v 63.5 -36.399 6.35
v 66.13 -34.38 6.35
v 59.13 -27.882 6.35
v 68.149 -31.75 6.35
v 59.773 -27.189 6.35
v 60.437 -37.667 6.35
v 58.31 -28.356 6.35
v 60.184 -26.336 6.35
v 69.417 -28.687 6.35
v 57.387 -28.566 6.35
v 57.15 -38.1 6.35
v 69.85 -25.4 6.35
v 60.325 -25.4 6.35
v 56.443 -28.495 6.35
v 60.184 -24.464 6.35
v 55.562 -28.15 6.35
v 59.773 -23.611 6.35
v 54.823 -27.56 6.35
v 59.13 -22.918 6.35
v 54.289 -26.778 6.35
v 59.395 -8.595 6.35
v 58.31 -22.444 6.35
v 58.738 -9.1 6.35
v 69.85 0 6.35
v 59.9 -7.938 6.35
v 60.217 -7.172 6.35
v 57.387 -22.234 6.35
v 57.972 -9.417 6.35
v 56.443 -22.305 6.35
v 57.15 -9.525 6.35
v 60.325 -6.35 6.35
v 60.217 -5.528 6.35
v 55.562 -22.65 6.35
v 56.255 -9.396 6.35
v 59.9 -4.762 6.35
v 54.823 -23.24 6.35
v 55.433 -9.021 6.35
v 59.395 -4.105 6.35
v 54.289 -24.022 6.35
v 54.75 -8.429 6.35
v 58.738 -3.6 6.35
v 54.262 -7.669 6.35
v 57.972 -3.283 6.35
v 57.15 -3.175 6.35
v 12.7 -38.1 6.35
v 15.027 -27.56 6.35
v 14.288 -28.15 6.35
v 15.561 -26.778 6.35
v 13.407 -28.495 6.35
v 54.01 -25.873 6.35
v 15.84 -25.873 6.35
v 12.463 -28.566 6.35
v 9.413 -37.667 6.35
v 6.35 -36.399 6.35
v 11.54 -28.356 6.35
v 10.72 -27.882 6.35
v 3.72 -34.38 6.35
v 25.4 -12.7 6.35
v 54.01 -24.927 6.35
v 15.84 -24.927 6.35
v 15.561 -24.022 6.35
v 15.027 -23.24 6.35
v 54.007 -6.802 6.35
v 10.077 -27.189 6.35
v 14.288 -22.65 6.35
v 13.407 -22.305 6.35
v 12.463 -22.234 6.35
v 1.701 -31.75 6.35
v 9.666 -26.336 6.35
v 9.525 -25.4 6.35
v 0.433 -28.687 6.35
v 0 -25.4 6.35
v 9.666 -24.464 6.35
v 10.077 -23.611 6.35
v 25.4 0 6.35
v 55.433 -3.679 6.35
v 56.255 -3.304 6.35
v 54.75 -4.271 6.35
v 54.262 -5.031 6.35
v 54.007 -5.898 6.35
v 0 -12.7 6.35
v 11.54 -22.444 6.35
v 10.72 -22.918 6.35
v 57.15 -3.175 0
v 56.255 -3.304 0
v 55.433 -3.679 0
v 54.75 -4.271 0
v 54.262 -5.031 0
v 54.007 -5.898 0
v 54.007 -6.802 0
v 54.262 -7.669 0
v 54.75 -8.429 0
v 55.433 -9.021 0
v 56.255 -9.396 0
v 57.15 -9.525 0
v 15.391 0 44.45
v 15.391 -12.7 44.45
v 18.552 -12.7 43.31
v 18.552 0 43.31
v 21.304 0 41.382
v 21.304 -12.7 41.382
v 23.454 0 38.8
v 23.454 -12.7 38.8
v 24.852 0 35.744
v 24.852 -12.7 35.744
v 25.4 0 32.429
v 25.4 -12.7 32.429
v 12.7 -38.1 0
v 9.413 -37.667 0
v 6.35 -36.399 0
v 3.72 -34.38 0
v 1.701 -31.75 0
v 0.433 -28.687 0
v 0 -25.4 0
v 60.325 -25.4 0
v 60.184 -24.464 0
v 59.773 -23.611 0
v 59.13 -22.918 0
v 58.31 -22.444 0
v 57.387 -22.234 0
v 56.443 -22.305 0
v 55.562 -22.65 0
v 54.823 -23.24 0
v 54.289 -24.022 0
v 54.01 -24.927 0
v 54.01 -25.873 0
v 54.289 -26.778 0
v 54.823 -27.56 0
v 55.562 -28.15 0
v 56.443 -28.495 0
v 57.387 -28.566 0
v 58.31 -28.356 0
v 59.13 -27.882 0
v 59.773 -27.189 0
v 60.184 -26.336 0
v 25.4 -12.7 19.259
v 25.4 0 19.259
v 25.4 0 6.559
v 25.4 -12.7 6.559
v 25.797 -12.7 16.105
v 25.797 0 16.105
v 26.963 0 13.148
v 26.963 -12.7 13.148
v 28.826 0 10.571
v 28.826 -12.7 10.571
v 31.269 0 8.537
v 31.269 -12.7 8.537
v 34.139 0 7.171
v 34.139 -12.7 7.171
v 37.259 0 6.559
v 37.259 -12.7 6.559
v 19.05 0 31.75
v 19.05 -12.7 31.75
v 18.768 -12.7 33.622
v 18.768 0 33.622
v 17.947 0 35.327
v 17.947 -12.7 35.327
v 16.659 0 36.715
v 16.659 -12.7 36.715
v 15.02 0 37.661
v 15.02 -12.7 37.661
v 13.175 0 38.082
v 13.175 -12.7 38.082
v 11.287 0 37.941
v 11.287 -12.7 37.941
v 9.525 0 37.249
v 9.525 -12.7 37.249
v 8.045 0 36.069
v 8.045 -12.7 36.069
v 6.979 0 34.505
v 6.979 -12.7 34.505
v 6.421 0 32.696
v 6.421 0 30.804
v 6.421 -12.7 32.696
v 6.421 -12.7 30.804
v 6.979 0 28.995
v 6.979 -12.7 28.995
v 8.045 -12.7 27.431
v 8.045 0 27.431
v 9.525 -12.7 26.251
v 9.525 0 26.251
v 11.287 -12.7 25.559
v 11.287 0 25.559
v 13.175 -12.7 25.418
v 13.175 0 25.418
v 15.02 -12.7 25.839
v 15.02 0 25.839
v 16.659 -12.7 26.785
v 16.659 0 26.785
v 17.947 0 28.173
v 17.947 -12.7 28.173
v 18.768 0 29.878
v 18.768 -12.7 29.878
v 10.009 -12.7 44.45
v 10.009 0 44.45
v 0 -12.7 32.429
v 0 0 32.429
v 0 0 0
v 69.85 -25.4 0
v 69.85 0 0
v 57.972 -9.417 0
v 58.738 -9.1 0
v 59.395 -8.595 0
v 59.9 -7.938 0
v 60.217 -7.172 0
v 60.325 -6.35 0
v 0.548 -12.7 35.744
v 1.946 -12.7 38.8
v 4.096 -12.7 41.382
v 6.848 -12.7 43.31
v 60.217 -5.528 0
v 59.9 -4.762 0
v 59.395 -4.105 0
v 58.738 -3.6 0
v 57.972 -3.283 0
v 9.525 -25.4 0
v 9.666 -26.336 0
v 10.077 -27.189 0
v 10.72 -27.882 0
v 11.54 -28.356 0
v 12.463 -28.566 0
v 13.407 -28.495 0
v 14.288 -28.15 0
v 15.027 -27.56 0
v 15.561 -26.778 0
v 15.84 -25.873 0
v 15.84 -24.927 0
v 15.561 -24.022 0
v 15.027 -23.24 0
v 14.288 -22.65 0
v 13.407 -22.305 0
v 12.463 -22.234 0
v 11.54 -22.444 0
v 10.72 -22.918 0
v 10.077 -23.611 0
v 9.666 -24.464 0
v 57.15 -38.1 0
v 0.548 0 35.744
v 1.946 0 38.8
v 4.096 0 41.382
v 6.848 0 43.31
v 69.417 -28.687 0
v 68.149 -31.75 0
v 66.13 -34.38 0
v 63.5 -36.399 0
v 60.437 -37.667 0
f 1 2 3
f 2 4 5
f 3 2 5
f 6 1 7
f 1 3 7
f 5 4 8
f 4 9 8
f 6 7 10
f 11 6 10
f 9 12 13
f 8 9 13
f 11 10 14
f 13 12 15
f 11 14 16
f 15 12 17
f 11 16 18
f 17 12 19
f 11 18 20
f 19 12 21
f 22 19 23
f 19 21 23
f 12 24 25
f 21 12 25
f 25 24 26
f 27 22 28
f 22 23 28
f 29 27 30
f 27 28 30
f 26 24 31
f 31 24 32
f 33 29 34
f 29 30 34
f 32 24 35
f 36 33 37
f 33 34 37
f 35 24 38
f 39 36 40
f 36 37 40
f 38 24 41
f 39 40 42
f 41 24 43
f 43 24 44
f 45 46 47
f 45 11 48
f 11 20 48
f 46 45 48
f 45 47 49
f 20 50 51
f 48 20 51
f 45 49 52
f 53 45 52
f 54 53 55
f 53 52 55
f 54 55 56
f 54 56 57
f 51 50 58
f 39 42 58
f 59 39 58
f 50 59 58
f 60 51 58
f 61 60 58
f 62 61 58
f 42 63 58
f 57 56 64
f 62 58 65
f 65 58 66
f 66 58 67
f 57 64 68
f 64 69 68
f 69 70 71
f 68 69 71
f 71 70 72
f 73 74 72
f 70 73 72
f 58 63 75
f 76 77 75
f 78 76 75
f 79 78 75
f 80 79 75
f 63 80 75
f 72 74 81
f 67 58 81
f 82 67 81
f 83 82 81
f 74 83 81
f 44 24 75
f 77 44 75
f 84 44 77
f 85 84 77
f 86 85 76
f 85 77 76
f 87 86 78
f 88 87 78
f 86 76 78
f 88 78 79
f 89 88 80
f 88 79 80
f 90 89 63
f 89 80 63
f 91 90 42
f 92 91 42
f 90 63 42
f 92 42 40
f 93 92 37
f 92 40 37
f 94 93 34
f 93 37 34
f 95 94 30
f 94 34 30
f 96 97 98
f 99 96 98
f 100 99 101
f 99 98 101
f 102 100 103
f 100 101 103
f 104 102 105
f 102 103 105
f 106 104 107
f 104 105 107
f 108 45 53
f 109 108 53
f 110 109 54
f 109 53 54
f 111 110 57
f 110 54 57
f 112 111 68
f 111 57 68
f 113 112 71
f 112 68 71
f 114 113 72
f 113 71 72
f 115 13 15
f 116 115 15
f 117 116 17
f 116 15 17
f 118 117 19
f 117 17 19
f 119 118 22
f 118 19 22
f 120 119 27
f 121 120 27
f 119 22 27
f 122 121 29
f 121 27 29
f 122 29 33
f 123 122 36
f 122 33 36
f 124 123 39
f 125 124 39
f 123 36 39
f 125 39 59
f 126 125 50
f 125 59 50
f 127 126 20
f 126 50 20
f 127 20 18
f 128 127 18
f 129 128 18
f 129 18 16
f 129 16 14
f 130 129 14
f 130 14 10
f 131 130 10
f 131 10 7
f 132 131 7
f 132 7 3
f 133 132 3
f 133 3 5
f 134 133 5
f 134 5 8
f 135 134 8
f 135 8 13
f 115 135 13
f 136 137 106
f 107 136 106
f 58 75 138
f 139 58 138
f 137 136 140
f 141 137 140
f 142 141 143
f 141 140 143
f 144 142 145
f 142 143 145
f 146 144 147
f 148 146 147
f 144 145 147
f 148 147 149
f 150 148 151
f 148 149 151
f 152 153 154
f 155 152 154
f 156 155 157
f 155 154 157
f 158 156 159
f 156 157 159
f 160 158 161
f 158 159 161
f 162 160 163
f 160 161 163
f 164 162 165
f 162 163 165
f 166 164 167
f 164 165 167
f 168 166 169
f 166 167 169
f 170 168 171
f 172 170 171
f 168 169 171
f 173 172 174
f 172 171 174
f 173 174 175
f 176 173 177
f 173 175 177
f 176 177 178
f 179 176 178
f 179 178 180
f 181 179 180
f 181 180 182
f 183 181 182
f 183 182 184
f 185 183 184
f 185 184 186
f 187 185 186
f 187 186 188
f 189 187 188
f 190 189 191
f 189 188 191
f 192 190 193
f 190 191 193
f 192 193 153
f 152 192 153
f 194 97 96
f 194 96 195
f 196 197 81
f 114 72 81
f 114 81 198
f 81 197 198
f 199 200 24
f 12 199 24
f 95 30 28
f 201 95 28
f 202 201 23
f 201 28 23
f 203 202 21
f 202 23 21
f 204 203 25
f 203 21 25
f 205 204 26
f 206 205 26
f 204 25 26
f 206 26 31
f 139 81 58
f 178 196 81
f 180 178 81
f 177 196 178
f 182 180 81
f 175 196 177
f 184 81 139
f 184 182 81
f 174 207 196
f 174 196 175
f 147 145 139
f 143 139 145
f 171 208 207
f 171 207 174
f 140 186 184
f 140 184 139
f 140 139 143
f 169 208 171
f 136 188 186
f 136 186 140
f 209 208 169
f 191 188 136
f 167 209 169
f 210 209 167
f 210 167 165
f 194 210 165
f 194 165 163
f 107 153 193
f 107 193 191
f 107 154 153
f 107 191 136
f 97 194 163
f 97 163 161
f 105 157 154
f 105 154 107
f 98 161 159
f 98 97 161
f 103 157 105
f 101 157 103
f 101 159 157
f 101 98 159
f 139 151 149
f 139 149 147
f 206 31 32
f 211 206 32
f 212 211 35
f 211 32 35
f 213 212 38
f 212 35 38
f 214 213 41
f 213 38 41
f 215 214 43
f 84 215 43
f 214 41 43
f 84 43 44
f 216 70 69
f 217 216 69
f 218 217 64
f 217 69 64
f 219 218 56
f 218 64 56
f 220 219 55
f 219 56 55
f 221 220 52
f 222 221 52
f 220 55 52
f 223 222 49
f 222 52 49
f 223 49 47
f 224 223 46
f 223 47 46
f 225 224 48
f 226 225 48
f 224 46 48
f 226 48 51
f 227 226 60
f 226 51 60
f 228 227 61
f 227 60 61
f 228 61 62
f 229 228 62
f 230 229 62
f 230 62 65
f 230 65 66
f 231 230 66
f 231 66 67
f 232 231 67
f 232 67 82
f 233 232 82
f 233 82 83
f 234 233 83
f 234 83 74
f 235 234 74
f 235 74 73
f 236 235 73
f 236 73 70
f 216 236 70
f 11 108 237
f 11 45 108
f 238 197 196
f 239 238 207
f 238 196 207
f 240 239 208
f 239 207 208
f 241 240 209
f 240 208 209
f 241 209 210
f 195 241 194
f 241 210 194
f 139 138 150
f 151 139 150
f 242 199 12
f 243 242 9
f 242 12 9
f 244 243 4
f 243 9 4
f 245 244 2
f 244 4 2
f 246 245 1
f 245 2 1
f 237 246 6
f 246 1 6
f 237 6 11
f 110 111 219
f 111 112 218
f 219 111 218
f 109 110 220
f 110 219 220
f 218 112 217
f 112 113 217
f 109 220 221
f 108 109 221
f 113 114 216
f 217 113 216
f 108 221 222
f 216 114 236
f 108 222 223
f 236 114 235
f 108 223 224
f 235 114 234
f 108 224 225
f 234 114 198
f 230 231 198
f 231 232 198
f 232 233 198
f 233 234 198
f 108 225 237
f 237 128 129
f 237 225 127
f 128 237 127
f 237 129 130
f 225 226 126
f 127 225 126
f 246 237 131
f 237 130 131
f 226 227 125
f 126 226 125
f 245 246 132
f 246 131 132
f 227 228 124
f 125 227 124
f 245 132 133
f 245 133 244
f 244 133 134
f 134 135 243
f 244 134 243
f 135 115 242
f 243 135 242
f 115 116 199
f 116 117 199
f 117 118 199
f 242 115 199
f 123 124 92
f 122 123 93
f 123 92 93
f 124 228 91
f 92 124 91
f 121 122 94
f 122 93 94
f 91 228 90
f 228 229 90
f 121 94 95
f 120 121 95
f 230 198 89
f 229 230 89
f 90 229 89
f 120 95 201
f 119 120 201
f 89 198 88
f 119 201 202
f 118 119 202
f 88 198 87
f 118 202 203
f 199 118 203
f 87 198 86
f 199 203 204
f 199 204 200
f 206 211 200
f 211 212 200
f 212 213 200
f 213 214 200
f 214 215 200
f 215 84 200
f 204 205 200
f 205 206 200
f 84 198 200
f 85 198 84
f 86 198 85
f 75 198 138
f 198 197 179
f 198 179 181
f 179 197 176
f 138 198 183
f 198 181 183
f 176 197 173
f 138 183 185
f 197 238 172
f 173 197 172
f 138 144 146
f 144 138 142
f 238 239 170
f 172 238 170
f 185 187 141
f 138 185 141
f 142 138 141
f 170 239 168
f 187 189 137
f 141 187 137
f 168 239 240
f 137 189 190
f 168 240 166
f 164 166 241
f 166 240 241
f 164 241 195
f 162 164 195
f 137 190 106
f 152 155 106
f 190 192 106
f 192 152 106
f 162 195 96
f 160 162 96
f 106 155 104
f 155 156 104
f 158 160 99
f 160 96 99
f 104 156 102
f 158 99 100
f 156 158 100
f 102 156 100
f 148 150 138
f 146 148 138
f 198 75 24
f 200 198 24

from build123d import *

# Parameters (mm, degrees)
F1_DEPTH  = 38.1
F2_W      = 25.4
F2_H      = 38.1
F3_DEPTH  = 25.4
F4_R      = 6.35
F5_DEPTH  = 12.701
F7_DEPTH  = 12.701
F8_W      = 12.7
F8_H      = 12.7
F9_DEPTH  = 12.7
F11_DEPTH = 12.701
F13_DEPTH = 6.351
F14_R     = 3.175
F15_DEPTH = 6.351


with BuildPart() as f1:
    # F0 (on Front) → F1 (new body)
    with BuildSketch(Plane.XZ):
        Polygon((25.4, 44.45), (0, 44.45), (0, 0), (69.85, 0), (69.85, 6.35), (25.4, 6.35), align=None)
    extrude(amount=F1_DEPTH)

    # F2 (on face) → F3 (cut)
    with BuildSketch(Plane.XZ.offset(38.1)):
        with Locations((12.7, 25.4)):
            Rectangle(F2_W, F2_H)
    extrude(amount=-F3_DEPTH, mode=Mode.SUBTRACT)

    # F4 (on face) → F5 (cut, through all)
    with BuildSketch(Plane.XZ.offset(12.7)):
        with Locations((12.7, 31.75)):
            Circle(F4_R)
    extrude(amount=-F5_DEPTH, mode=Mode.SUBTRACT)

    # F6 (on face) → F7 (cut, through all)
    with BuildSketch(Plane.XZ.offset(12.7)):
        with BuildLine():
            ThreePointArc((0, 32.429072573), (-0.0062022328, 32.0321151685), (0, 31.635157764))
            Line((0, 31.635157764), (0, 32.429072573))
        make_face()
        with BuildLine():
            ThreePointArc((19.05, 31.75), (12.642576534, 38.0997403526), (6.3510385683, 31.635157764))
            Line((6.3510385683, 31.635157764), (19.0489614317, 31.635157764))
            ThreePointArc((19.0489614317, 31.635157764), (19.0497403526, 31.692576534), (19.05, 31.75))
        make_face()
        with BuildLine():
            Line((0, 44.45), (0, 32.429072573))
            ThreePointArc((0, 32.429072573), (2.9352888733, 40.1621823142), (10.0085855964, 44.45))
            Line((10.0085855964, 44.45), (0, 44.45))
        make_face()
        with BuildLine():
            ThreePointArc((15.3914144036, 44.45), (12.7, 44.7383174013), (10.0085855964, 44.45))
            Line((10.0085855964, 44.45), (15.3914144036, 44.45))
        make_face()
        with BuildLine():
            Line((25.4, 32.429072573), (25.4, 31.635157764))
            ThreePointArc((25.4, 31.635157764), (25.4062022328, 32.0321151685), (25.4, 32.429072573))
        make_face()
        with BuildLine():
            Line((25.4, 44.45), (15.3914144036, 44.45))
            ThreePointArc((15.3914144036, 44.45), (22.4647111267, 40.1621823142), (25.4, 32.429072573))
            Line((25.4, 32.429072573), (25.4, 44.45))
        make_face()
    extrude(amount=-F7_DEPTH, mode=Mode.SUBTRACT)

    # F8 (on Front) → F9 (join)
    with BuildSketch(Plane.XZ):
        with Locations((30.9091203046, 12.9094149452)):
            Rectangle(F8_W, F8_H)
    extrude(amount=F9_DEPTH)

    # F10 (on face) → F11 (cut, through all)
    with BuildSketch(Plane.XZ.offset(12.7)):
        with BuildLine():
            Line((37.2591203046, 19.2594149452), (25.4, 19.2594149452))
            ThreePointArc((25.4, 19.2594149452), (28.8257307878, 10.5713666258), (37.2591203046, 6.5594149452))
            Line((37.2591203046, 6.5594149452), (37.2591203046, 19.2594149452))
        make_face()
    extrude(amount=-F11_DEPTH, mode=Mode.SUBTRACT)

    # F12 (on face) → F13 (cut, through all)
    with BuildSketch(Plane.XY.offset(6.35)):
        with BuildLine():
            ThreePointArc((12.7, -38.1), (3.7197438789, -34.3802561211), (0, -25.4))
            Line((0, -25.4), (0, -38.1))
            Line((0, -38.1), (12.7, -38.1))
        make_face()
        with BuildLine():
            ThreePointArc((69.85, -25.4), (66.1302561211, -34.3802561211), (57.15, -38.1))
            Line((57.15, -38.1), (69.85, -38.1))
            Line((69.85, -38.1), (69.85, -25.4))
        make_face()
    extrude(amount=-F13_DEPTH, mode=Mode.SUBTRACT)

    # F14 (on face) → F15 (cut, through all)
    with BuildSketch(Plane.XY.offset(6.35)):
        with BuildLine():
            ThreePointArc((15.875, -25.4), (12.7, -22.225), (9.525, -25.4))
            ThreePointArc((9.525, -25.4), (12.7, -28.575), (15.875, -25.4))
        make_face()
        with Locations((57.15, -25.4)):
            Circle(F14_R)
        with BuildLine():
            Line((57.15, -9.525), (57.15, -3.175))
            ThreePointArc((57.15, -3.175), (53.975, -6.35), (57.15, -9.525))
        make_face()
        with BuildLine():
            ThreePointArc((60.325, -6.35), (59.3950640303, -4.1049359697), (57.15, -3.175))
            Line((57.15, -3.175), (57.15, -9.525))
            ThreePointArc((57.15, -9.525), (59.3950640303, -8.5950640303), (60.325, -6.35))
        make_face()
    extrude(amount=-F15_DEPTH, mode=Mode.SUBTRACT)


solid = f1.part
